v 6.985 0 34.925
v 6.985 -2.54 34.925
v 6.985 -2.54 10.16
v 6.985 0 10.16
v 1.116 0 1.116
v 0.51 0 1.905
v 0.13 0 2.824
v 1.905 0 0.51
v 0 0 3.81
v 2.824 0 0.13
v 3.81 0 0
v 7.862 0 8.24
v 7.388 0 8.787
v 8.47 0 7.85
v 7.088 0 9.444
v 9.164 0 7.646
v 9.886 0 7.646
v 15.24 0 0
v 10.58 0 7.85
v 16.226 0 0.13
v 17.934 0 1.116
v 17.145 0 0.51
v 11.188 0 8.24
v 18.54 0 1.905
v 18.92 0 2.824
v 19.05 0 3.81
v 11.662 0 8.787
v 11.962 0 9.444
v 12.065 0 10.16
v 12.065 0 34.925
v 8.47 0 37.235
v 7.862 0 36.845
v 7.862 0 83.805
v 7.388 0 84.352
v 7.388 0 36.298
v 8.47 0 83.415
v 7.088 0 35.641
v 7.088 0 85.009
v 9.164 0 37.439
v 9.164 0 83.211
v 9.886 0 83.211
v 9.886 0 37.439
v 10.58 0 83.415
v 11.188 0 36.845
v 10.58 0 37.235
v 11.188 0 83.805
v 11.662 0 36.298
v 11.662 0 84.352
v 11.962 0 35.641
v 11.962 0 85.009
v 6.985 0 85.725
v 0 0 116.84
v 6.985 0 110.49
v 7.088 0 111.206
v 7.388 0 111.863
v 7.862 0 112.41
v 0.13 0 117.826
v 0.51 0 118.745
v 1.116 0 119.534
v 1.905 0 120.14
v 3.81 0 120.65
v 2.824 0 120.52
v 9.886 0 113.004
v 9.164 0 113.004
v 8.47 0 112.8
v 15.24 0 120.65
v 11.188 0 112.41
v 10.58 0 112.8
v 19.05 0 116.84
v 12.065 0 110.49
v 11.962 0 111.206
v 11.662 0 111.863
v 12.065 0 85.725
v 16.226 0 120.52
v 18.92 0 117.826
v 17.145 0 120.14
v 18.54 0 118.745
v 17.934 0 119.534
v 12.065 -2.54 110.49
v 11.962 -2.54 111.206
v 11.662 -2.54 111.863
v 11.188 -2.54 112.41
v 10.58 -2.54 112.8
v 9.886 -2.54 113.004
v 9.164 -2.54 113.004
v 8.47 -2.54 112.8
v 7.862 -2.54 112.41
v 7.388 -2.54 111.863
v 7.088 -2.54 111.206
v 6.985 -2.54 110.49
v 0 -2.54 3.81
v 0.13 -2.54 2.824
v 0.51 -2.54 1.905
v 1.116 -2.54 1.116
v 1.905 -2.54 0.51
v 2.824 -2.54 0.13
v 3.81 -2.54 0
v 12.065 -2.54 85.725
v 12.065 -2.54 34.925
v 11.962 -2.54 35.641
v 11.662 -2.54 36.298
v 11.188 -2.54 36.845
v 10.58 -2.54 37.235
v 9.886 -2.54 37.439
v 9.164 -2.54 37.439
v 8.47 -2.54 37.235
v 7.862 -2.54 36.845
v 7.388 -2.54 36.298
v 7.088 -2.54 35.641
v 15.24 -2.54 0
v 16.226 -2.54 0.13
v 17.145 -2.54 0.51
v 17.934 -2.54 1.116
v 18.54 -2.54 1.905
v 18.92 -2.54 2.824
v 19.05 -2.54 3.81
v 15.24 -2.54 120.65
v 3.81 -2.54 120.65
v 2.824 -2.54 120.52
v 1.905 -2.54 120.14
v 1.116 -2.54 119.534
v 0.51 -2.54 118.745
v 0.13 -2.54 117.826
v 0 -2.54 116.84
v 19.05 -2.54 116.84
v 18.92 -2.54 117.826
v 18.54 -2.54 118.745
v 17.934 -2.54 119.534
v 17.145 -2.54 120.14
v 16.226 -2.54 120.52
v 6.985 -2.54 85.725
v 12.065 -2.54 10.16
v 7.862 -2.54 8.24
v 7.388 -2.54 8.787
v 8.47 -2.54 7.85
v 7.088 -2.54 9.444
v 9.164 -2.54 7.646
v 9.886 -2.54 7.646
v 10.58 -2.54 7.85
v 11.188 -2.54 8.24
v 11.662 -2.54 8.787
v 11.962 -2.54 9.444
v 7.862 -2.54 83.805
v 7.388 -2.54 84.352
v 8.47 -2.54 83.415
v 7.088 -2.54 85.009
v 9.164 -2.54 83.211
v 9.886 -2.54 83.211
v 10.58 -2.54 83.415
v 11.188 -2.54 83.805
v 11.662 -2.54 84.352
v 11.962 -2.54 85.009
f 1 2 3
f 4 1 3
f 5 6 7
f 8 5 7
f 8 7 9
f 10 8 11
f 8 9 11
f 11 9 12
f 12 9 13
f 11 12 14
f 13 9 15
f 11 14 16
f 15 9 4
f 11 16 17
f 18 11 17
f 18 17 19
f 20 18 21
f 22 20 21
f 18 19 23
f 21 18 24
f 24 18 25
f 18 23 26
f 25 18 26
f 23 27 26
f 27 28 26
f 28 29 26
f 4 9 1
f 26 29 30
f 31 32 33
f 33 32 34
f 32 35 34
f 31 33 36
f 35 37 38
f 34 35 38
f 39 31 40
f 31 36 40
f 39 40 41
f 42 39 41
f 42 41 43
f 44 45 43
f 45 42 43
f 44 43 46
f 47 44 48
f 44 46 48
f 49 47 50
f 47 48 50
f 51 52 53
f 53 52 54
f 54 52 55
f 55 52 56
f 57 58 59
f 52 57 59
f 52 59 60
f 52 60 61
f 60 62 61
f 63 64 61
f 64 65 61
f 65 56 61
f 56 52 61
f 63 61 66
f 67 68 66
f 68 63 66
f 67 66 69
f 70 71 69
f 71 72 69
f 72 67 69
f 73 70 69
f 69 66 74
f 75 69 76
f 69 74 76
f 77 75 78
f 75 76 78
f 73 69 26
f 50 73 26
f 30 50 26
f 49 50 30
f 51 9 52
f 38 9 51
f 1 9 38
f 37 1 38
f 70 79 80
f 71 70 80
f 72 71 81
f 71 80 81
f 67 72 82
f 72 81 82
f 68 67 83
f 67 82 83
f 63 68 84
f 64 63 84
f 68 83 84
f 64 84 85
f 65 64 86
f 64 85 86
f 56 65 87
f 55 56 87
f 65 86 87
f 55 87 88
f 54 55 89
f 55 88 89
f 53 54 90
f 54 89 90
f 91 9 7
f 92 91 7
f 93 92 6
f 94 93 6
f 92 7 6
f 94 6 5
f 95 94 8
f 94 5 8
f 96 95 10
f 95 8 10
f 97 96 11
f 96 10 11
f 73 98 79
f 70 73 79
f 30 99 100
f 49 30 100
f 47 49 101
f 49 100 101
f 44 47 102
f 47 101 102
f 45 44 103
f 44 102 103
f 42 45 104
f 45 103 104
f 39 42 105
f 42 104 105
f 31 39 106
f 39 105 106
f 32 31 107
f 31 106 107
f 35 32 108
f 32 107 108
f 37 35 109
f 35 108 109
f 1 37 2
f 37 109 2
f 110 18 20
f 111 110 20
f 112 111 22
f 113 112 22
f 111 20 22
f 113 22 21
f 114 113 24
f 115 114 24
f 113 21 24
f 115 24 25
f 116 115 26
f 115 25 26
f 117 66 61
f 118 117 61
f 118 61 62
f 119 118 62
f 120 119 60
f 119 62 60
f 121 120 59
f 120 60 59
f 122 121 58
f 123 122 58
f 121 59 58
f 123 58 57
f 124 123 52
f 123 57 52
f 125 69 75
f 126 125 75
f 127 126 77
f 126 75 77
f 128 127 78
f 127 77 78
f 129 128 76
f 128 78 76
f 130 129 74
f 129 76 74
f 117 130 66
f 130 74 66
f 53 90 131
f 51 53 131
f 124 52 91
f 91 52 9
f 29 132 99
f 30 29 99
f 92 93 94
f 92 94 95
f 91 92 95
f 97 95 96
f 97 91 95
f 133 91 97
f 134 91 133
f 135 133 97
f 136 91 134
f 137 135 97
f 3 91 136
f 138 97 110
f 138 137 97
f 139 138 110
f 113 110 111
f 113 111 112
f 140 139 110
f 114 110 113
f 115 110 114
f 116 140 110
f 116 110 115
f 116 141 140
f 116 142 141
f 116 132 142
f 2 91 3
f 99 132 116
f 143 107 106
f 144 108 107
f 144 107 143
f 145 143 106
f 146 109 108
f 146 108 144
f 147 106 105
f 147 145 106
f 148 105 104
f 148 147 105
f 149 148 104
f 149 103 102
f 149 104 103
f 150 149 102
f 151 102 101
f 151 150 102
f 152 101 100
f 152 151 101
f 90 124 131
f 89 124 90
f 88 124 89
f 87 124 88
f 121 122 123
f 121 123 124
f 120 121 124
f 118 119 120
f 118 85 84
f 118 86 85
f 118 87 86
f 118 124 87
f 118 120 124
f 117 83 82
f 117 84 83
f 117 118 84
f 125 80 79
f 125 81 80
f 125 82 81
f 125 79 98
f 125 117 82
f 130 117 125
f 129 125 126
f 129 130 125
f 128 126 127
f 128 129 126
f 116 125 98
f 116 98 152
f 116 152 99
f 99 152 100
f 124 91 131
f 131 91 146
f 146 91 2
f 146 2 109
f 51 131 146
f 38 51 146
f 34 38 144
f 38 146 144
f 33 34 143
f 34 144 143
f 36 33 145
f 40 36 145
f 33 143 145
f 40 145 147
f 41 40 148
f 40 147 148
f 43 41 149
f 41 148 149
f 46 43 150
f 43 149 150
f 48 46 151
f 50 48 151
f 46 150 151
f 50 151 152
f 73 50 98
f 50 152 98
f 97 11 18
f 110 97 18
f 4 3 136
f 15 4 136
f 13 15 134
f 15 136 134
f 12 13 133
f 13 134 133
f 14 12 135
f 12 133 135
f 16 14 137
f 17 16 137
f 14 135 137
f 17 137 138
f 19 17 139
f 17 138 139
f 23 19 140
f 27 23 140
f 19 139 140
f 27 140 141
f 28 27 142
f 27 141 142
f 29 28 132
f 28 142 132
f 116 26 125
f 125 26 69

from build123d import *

# Parameters (mm, degrees)
F1_DEPTH = 2.54
F3_DEPTH = 2.541


with BuildPart() as f1:
    # F0 (on Front) → F1 (new body)
    with BuildSketch(Plane.XZ):
        with BuildLine():
            ThreePointArc((0, 3.81), (1.115923, 1.115923), (3.81, 0))
            Line((3.81, 0), (15.24, 0))
            ThreePointArc((15.24, 0), (17.934077, 1.115923), (19.05, 3.81))
            Line((19.05, 3.81), (19.05, 116.84))
            ThreePointArc((19.05, 116.84), (17.934077, 119.534077), (15.24, 120.65))
            Line((15.24, 120.65), (3.81, 120.65))
            ThreePointArc((3.81, 120.65), (1.115923, 119.534077), (0, 116.84))
            Line((0, 116.84), (0, 3.81))
        make_face()
    extrude(amount=F1_DEPTH)

    # F2 (on face) → F3 (cut, through all)
    with BuildSketch(Plane.XZ.offset(2.54)):
        with BuildLine():
            ThreePointArc((12.065, 110.49), (9.525, 113.03), (6.985, 110.49))
            Line((6.985, 110.49), (6.985, 85.725))
            ThreePointArc((6.985, 85.725), (9.525, 83.185), (12.065, 85.725))
            Line((12.065, 85.725), (12.065, 110.49))
        make_face()
        with BuildLine():
            ThreePointArc((6.985, 10.16), (9.525, 7.62), (12.065, 10.16))
            Line((12.065, 10.16), (12.065, 34.925))
            ThreePointArc((12.065, 34.925), (9.525, 37.465), (6.985, 34.925))
            Line((6.985, 34.925), (6.985, 10.16))
        make_face()
    extrude(amount=-F3_DEPTH, mode=Mode.SUBTRACT)


solid = f1.part
